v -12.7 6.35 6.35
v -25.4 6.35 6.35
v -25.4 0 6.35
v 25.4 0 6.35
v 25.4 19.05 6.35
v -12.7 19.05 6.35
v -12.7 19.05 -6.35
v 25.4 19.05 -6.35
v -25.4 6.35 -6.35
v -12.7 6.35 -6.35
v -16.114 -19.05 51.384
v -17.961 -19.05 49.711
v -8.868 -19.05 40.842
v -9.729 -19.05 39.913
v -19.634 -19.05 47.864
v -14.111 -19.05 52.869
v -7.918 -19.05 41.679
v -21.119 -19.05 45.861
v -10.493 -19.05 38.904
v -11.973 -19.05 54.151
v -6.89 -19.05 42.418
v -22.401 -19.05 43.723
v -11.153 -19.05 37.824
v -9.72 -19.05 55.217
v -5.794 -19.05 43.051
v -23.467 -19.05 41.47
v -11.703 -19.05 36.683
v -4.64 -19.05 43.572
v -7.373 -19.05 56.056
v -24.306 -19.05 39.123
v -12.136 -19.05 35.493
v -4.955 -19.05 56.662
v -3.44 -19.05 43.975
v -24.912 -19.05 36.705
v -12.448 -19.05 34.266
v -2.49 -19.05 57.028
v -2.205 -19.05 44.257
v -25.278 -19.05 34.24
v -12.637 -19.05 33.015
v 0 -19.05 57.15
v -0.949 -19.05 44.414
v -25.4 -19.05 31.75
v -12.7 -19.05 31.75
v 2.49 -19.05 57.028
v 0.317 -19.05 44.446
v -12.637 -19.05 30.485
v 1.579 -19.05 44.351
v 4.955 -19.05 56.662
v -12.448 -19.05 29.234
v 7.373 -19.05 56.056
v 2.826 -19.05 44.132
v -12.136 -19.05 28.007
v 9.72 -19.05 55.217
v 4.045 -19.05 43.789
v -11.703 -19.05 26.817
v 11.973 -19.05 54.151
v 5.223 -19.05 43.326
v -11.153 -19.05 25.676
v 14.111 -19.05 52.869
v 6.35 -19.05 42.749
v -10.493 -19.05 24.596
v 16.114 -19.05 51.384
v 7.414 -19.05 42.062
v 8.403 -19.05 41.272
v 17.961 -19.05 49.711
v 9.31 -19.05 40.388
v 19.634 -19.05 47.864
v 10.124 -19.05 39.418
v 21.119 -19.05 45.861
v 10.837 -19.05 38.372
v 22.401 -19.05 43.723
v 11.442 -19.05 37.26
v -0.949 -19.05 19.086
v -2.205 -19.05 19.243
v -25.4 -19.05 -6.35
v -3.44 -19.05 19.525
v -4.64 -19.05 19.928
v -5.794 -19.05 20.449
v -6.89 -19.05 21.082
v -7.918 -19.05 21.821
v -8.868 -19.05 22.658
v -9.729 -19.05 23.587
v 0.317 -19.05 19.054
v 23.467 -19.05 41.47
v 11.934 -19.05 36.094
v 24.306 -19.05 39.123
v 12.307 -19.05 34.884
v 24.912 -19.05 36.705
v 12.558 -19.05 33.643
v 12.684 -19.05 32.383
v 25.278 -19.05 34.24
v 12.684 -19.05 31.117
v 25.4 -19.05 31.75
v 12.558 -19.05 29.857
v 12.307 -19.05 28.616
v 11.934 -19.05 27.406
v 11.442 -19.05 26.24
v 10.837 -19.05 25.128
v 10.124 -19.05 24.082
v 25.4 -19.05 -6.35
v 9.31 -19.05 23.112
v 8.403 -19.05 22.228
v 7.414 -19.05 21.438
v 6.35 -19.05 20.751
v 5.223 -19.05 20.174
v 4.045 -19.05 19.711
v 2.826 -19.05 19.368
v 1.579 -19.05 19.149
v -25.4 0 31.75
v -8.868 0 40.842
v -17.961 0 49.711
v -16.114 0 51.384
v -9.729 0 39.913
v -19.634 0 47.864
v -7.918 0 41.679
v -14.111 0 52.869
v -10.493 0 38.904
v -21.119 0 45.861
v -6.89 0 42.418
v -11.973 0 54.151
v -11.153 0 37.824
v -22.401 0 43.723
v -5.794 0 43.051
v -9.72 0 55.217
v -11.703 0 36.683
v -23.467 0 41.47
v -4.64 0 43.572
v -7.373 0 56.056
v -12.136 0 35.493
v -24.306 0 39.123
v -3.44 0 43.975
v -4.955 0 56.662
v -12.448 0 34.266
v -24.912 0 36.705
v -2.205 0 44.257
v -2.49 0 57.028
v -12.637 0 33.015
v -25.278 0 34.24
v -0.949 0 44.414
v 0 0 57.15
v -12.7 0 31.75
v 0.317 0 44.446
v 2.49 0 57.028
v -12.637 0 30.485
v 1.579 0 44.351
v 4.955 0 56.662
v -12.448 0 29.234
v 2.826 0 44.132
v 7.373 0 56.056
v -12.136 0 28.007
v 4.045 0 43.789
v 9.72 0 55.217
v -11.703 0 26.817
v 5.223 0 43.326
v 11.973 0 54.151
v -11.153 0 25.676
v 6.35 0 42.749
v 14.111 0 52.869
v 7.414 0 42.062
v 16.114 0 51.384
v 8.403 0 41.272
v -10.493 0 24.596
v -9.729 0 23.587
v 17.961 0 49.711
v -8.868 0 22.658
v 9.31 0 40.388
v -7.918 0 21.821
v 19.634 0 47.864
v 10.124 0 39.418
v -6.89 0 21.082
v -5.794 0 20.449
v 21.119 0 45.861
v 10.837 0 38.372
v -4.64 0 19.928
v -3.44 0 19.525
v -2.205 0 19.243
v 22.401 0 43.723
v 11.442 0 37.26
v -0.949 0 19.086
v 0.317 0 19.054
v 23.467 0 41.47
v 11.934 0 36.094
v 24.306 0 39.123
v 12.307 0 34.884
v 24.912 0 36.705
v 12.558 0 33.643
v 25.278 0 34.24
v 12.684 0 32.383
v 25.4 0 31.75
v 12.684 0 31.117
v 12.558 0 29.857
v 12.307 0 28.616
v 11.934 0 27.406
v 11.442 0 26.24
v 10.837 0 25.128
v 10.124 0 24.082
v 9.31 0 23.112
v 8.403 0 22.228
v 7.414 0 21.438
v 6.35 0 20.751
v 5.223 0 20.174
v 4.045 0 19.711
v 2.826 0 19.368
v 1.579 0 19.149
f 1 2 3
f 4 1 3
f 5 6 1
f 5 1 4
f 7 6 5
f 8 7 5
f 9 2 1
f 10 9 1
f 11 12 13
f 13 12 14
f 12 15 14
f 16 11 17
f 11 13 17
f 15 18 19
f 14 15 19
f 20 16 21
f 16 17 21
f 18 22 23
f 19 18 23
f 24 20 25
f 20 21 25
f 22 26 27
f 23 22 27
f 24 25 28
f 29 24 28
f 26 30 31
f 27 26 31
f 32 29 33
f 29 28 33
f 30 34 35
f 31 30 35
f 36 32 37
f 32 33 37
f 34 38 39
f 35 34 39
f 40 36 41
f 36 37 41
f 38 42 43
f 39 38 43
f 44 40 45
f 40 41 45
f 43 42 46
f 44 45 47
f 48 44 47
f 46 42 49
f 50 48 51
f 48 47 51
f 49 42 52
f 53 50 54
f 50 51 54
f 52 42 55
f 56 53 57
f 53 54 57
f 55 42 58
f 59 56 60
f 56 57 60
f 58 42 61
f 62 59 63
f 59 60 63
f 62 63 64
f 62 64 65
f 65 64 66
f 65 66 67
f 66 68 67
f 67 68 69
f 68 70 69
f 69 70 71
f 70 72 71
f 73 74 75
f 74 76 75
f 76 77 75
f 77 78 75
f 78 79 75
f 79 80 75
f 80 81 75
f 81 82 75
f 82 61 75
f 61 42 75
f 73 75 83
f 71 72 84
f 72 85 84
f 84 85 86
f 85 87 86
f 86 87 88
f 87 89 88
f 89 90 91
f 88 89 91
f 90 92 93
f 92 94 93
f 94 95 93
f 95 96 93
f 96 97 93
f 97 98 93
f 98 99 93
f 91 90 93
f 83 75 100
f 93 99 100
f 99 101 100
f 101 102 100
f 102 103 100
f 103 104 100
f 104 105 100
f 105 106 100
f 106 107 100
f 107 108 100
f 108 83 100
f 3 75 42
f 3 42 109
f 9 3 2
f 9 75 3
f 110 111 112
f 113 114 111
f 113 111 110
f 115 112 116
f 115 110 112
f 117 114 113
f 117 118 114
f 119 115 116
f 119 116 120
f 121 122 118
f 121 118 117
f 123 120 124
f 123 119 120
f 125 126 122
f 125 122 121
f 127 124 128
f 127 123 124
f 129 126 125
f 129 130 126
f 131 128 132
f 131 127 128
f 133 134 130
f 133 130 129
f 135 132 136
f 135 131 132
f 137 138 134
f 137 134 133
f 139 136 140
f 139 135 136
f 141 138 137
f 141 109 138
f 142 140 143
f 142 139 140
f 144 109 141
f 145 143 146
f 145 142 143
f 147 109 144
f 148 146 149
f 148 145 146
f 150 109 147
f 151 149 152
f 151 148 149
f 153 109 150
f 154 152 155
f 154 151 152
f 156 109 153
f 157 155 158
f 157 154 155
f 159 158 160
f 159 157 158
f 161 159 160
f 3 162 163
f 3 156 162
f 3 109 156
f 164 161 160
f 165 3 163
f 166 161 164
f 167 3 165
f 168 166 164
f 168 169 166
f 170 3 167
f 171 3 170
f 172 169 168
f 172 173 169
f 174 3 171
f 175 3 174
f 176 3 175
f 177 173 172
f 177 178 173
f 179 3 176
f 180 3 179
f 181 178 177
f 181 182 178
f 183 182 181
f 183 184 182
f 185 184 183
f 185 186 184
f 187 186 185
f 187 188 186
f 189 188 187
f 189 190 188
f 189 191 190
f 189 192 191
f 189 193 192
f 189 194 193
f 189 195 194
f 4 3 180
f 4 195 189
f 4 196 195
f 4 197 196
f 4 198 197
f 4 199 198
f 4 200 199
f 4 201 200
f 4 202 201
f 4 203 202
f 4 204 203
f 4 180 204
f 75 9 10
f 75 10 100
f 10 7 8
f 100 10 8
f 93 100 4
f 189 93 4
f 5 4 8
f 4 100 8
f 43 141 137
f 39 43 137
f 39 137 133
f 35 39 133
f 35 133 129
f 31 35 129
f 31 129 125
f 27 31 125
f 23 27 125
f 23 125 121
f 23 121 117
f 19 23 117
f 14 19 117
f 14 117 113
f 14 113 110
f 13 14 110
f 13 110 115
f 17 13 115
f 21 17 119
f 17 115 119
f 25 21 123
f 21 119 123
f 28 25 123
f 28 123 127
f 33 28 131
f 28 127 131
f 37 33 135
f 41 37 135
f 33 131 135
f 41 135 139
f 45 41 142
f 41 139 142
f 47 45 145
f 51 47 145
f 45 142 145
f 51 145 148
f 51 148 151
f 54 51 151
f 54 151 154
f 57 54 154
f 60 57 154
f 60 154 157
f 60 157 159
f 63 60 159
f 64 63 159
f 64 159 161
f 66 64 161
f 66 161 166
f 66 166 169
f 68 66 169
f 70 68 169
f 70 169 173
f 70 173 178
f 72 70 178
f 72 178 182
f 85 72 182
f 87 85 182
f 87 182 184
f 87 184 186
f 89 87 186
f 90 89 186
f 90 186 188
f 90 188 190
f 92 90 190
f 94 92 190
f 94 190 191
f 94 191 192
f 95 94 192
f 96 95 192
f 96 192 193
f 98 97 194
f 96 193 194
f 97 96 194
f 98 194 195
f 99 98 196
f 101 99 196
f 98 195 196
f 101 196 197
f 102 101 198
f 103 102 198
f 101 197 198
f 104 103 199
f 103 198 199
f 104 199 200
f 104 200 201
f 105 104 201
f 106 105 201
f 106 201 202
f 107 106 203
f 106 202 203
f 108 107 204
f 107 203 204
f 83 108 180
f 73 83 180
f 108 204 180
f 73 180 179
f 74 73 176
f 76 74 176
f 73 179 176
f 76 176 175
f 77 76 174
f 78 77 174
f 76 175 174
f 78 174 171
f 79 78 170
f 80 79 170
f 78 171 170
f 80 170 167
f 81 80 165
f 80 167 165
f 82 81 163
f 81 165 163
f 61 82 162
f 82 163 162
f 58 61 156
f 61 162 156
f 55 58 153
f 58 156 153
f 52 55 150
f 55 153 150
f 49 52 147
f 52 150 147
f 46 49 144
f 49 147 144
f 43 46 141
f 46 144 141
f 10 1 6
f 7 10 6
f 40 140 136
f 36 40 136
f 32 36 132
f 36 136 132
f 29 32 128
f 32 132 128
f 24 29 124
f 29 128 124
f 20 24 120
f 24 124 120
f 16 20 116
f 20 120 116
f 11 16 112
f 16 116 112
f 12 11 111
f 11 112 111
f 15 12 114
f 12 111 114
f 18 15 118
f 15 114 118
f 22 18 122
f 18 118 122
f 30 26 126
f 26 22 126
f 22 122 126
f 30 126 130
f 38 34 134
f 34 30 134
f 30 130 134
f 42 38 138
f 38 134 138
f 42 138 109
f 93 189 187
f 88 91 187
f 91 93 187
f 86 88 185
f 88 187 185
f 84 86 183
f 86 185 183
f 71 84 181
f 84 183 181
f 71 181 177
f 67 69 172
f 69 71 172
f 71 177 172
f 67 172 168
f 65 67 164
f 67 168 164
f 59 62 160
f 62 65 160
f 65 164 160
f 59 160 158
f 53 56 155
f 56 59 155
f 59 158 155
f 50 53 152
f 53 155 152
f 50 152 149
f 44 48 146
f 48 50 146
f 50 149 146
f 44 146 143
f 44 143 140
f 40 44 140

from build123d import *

# Parameters (mm, degrees)
F0_W     = 50.8
F0_H     = 38.1
F1_DEPTH = 6.35
F2_W     = 12.7
F2_H     = 12.7
F3_DEPTH = 12.701
F4_W     = 50.8
F4_H     = 19.05
F5_DEPTH = 50.8
F7_DEPTH = 19.051
F6_R     = 12.7
F8_DEPTH = 19.051


# Not quite as in the source:
# - a feature names something its author has since deleted; it is built from what else it names


with BuildPart() as f1:
    # F0 (on Top) → F1 (new body, symmetric)
    with BuildSketch(Plane.XY):
        Rectangle(F0_W, F0_H)
    extrude(amount=F1_DEPTH, both=True)

    # F2 (on face) → F3 (cut, through all)
    with BuildSketch(Plane.XY.offset(6.35)):
        with Locations((-19.05, 12.7)):
            Rectangle(F2_W, F2_H)
    extrude(amount=-F3_DEPTH, mode=Mode.SUBTRACT)

    # F4 (on face) → F5 (join)
    with BuildSketch(Plane.XY.offset(6.35)):
        with Locations((0, -9.525)):
            Rectangle(F4_W, F4_H)
    extrude(amount=F5_DEPTH)

    # F6 (on face) → F7 (cut, through all)
    with BuildSketch(Plane(origin=(0, 0, 0), x_dir=(-1, 0, 0), z_dir=(0, 1, 0))):
        with BuildLine():
            ThreePointArc((-25.4, 31.75), (-17.9605122618, 49.7105122225), (-5.57e-08, 57.15))
            Line((-5.57e-08, 57.15), (-25.4, 57.15))
            Line((-25.4, 57.15), (-25.4, 31.75))
        make_face()
        with BuildLine():
            ThreePointArc((-5.57e-08, 57.15), (17.9605122225, 49.7105122618), (25.4, 31.75))
            Line((25.4, 31.75), (25.4, 57.15))
            Line((25.4, 57.15), (-5.57e-08, 57.15))
        make_face()
    extrude(amount=-F7_DEPTH, mode=Mode.SUBTRACT)

    # F6 (on face) → F8 (cut, through all)
    with BuildSketch(Plane(origin=(0, 0, 0), x_dir=(-1, 0, 0), z_dir=(0, 1, 0))):
        with Locations((0, 31.75)):
            Circle(F6_R)
    extrude(amount=-F8_DEPTH, mode=Mode.SUBTRACT)


solid = f1.part
